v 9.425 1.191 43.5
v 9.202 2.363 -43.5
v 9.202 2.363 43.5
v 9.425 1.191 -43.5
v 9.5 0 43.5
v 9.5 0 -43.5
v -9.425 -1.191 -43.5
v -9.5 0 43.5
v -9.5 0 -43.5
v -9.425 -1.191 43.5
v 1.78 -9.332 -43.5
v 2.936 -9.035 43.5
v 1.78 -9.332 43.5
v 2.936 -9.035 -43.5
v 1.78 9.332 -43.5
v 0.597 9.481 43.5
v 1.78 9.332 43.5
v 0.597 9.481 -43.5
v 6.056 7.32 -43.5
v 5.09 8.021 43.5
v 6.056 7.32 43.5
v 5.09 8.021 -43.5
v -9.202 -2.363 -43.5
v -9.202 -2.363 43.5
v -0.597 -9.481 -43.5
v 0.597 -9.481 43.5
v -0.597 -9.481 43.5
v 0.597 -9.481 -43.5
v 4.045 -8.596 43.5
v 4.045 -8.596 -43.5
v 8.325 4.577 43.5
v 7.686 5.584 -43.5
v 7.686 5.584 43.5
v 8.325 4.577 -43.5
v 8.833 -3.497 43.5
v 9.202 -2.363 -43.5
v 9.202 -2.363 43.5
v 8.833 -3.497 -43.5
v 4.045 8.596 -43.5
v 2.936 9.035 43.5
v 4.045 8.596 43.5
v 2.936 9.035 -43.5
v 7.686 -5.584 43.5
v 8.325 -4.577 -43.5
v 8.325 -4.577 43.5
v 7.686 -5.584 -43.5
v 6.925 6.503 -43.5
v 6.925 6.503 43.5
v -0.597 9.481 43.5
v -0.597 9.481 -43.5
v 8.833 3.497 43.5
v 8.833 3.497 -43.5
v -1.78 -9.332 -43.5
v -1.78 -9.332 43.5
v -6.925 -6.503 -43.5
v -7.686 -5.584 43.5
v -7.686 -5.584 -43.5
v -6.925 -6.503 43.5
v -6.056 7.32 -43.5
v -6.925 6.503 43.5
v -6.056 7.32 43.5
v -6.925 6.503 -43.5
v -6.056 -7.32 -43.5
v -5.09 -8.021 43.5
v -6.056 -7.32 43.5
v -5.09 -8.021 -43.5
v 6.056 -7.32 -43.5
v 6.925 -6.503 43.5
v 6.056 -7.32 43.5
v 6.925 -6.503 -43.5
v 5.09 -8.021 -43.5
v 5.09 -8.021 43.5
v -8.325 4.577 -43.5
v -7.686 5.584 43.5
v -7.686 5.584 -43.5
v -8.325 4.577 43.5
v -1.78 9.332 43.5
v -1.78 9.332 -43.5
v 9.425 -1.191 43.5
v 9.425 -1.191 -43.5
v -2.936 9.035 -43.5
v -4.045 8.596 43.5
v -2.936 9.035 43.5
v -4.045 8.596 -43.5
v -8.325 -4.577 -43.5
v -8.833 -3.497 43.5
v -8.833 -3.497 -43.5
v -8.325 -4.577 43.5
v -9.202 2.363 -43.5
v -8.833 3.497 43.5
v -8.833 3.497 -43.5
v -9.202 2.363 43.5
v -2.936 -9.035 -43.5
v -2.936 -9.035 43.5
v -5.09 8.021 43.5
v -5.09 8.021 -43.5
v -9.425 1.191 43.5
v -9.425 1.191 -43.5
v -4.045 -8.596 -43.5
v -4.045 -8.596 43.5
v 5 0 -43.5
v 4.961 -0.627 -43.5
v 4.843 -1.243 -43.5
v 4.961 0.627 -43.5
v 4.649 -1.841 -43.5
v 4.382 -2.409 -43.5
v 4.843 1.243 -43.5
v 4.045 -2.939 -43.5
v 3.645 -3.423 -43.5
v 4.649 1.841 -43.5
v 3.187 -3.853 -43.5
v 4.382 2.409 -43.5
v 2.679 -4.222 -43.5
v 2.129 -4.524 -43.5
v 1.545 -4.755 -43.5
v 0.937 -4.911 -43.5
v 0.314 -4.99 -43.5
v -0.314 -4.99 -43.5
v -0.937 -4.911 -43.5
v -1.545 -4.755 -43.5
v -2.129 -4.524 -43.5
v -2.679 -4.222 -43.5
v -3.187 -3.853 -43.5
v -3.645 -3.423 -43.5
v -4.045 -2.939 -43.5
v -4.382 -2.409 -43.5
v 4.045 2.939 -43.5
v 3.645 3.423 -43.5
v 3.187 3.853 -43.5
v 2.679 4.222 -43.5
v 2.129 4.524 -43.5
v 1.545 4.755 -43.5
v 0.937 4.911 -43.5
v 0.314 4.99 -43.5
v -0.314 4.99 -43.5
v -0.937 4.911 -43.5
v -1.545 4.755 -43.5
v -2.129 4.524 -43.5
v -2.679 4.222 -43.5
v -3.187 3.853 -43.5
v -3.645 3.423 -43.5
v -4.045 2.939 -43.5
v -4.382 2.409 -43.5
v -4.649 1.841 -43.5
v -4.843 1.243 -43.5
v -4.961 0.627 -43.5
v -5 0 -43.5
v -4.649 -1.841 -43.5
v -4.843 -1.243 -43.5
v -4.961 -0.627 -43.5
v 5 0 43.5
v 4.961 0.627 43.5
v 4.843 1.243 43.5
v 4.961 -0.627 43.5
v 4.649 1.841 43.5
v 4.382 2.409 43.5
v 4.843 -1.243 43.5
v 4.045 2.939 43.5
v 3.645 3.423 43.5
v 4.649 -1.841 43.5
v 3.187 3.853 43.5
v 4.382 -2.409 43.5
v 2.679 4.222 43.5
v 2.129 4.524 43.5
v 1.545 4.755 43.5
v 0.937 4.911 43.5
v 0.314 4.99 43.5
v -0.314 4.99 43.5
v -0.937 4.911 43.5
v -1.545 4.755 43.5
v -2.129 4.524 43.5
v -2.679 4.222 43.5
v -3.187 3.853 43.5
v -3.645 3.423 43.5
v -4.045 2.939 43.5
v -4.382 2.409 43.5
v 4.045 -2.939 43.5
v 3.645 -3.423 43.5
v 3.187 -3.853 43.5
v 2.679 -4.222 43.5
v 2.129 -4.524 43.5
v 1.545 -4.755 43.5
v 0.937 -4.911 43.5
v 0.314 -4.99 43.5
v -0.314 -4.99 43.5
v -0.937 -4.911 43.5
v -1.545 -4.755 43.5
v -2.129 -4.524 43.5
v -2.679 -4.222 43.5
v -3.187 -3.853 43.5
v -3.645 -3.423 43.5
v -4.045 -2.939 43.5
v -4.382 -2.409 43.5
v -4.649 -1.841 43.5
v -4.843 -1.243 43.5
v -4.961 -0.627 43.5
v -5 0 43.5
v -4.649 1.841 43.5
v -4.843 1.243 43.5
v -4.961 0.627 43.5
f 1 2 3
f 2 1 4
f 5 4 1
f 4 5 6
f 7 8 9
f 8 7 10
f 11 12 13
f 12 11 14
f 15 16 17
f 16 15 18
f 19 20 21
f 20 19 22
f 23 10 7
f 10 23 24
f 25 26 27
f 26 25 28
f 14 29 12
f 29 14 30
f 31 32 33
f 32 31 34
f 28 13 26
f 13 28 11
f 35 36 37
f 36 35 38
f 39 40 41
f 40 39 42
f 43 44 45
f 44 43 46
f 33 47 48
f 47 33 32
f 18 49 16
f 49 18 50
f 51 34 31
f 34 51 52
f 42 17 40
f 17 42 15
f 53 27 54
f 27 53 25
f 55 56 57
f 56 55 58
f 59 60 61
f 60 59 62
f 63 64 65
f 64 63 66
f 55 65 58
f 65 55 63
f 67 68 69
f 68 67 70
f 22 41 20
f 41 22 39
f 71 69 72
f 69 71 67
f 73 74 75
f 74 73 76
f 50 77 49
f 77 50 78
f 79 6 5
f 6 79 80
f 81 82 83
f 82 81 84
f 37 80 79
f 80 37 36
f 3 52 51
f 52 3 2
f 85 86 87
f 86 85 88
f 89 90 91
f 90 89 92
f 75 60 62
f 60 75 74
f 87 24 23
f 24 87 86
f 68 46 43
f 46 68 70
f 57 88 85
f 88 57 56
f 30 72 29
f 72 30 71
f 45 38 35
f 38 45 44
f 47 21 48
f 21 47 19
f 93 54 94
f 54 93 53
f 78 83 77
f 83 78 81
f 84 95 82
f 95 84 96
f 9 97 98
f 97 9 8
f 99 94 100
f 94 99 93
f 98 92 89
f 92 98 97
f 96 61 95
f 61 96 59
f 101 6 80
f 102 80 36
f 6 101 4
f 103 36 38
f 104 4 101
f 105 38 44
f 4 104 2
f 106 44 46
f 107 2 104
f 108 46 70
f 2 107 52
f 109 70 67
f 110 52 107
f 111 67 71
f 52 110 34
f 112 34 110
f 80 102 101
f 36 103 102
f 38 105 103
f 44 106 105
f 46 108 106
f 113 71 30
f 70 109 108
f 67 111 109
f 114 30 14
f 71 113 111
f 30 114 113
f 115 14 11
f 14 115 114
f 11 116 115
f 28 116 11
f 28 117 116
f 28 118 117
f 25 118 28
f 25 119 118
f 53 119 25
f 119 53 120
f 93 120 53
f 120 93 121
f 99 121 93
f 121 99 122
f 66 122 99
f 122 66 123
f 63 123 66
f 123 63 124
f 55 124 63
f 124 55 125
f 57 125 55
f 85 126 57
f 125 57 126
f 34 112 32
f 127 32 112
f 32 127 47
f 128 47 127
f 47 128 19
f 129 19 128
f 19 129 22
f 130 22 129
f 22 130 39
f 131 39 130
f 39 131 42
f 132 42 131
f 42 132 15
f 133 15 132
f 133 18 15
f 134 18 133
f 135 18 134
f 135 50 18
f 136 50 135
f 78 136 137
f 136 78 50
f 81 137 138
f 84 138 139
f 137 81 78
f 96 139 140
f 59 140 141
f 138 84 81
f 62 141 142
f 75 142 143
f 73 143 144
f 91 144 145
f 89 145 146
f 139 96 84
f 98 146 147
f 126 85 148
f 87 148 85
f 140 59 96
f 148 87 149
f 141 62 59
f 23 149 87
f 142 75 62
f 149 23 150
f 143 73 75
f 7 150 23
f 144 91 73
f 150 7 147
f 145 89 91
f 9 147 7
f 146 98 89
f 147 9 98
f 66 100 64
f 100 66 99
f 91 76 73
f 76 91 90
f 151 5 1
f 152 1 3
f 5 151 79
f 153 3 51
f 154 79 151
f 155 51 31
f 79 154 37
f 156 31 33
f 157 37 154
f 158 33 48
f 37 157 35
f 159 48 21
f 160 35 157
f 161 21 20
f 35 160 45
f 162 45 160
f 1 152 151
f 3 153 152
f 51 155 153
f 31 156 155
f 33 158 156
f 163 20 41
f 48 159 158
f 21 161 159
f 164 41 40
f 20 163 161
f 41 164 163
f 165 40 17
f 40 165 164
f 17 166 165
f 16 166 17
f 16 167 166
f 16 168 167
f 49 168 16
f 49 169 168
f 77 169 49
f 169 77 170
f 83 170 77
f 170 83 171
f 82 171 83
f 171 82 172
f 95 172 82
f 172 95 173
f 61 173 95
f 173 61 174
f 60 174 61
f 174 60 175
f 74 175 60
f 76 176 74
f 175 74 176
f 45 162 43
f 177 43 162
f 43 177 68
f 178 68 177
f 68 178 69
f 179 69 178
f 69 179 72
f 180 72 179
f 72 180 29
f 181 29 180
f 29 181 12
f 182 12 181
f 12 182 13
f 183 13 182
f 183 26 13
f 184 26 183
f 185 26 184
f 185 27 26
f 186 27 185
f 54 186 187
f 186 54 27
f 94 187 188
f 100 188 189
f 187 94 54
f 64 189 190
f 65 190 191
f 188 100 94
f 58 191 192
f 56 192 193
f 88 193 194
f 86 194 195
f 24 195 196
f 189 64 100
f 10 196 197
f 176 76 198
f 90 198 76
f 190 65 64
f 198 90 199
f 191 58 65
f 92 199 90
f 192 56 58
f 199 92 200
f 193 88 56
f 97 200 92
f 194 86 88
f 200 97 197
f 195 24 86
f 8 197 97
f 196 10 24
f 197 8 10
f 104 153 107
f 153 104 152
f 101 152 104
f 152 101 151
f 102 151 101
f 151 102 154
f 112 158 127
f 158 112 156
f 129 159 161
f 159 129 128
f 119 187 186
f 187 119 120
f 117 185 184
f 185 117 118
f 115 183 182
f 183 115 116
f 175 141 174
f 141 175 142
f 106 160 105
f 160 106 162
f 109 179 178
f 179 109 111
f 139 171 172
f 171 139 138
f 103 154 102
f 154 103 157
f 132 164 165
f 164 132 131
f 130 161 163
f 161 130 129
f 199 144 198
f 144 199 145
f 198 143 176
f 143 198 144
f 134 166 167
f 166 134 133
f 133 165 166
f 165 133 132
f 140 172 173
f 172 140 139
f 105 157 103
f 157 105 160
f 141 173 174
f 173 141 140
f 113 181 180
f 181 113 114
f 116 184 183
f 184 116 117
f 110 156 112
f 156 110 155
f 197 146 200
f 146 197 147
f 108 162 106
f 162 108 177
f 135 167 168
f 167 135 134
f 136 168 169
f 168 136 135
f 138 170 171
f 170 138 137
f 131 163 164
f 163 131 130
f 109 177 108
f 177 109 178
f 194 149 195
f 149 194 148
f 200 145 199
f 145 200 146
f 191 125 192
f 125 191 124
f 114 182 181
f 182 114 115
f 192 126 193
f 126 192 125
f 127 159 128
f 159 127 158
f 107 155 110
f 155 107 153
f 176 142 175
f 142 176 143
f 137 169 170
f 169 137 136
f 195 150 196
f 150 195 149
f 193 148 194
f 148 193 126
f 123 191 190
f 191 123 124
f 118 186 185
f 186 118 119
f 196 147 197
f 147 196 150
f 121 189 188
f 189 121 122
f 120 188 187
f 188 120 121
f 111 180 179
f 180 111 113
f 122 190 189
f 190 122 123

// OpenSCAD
$fn = 50;


difference() {
	union() {
		translate(v = [0, 0, -43.5000000000]) {
			cylinder(h = 87, r = 9.5000000000);
		}
	}
	union() {
		translate(v = [0, 0, -100.0000000000]) {
			cylinder(h = 200, r = 5.0000000000);
		}
	}
}
